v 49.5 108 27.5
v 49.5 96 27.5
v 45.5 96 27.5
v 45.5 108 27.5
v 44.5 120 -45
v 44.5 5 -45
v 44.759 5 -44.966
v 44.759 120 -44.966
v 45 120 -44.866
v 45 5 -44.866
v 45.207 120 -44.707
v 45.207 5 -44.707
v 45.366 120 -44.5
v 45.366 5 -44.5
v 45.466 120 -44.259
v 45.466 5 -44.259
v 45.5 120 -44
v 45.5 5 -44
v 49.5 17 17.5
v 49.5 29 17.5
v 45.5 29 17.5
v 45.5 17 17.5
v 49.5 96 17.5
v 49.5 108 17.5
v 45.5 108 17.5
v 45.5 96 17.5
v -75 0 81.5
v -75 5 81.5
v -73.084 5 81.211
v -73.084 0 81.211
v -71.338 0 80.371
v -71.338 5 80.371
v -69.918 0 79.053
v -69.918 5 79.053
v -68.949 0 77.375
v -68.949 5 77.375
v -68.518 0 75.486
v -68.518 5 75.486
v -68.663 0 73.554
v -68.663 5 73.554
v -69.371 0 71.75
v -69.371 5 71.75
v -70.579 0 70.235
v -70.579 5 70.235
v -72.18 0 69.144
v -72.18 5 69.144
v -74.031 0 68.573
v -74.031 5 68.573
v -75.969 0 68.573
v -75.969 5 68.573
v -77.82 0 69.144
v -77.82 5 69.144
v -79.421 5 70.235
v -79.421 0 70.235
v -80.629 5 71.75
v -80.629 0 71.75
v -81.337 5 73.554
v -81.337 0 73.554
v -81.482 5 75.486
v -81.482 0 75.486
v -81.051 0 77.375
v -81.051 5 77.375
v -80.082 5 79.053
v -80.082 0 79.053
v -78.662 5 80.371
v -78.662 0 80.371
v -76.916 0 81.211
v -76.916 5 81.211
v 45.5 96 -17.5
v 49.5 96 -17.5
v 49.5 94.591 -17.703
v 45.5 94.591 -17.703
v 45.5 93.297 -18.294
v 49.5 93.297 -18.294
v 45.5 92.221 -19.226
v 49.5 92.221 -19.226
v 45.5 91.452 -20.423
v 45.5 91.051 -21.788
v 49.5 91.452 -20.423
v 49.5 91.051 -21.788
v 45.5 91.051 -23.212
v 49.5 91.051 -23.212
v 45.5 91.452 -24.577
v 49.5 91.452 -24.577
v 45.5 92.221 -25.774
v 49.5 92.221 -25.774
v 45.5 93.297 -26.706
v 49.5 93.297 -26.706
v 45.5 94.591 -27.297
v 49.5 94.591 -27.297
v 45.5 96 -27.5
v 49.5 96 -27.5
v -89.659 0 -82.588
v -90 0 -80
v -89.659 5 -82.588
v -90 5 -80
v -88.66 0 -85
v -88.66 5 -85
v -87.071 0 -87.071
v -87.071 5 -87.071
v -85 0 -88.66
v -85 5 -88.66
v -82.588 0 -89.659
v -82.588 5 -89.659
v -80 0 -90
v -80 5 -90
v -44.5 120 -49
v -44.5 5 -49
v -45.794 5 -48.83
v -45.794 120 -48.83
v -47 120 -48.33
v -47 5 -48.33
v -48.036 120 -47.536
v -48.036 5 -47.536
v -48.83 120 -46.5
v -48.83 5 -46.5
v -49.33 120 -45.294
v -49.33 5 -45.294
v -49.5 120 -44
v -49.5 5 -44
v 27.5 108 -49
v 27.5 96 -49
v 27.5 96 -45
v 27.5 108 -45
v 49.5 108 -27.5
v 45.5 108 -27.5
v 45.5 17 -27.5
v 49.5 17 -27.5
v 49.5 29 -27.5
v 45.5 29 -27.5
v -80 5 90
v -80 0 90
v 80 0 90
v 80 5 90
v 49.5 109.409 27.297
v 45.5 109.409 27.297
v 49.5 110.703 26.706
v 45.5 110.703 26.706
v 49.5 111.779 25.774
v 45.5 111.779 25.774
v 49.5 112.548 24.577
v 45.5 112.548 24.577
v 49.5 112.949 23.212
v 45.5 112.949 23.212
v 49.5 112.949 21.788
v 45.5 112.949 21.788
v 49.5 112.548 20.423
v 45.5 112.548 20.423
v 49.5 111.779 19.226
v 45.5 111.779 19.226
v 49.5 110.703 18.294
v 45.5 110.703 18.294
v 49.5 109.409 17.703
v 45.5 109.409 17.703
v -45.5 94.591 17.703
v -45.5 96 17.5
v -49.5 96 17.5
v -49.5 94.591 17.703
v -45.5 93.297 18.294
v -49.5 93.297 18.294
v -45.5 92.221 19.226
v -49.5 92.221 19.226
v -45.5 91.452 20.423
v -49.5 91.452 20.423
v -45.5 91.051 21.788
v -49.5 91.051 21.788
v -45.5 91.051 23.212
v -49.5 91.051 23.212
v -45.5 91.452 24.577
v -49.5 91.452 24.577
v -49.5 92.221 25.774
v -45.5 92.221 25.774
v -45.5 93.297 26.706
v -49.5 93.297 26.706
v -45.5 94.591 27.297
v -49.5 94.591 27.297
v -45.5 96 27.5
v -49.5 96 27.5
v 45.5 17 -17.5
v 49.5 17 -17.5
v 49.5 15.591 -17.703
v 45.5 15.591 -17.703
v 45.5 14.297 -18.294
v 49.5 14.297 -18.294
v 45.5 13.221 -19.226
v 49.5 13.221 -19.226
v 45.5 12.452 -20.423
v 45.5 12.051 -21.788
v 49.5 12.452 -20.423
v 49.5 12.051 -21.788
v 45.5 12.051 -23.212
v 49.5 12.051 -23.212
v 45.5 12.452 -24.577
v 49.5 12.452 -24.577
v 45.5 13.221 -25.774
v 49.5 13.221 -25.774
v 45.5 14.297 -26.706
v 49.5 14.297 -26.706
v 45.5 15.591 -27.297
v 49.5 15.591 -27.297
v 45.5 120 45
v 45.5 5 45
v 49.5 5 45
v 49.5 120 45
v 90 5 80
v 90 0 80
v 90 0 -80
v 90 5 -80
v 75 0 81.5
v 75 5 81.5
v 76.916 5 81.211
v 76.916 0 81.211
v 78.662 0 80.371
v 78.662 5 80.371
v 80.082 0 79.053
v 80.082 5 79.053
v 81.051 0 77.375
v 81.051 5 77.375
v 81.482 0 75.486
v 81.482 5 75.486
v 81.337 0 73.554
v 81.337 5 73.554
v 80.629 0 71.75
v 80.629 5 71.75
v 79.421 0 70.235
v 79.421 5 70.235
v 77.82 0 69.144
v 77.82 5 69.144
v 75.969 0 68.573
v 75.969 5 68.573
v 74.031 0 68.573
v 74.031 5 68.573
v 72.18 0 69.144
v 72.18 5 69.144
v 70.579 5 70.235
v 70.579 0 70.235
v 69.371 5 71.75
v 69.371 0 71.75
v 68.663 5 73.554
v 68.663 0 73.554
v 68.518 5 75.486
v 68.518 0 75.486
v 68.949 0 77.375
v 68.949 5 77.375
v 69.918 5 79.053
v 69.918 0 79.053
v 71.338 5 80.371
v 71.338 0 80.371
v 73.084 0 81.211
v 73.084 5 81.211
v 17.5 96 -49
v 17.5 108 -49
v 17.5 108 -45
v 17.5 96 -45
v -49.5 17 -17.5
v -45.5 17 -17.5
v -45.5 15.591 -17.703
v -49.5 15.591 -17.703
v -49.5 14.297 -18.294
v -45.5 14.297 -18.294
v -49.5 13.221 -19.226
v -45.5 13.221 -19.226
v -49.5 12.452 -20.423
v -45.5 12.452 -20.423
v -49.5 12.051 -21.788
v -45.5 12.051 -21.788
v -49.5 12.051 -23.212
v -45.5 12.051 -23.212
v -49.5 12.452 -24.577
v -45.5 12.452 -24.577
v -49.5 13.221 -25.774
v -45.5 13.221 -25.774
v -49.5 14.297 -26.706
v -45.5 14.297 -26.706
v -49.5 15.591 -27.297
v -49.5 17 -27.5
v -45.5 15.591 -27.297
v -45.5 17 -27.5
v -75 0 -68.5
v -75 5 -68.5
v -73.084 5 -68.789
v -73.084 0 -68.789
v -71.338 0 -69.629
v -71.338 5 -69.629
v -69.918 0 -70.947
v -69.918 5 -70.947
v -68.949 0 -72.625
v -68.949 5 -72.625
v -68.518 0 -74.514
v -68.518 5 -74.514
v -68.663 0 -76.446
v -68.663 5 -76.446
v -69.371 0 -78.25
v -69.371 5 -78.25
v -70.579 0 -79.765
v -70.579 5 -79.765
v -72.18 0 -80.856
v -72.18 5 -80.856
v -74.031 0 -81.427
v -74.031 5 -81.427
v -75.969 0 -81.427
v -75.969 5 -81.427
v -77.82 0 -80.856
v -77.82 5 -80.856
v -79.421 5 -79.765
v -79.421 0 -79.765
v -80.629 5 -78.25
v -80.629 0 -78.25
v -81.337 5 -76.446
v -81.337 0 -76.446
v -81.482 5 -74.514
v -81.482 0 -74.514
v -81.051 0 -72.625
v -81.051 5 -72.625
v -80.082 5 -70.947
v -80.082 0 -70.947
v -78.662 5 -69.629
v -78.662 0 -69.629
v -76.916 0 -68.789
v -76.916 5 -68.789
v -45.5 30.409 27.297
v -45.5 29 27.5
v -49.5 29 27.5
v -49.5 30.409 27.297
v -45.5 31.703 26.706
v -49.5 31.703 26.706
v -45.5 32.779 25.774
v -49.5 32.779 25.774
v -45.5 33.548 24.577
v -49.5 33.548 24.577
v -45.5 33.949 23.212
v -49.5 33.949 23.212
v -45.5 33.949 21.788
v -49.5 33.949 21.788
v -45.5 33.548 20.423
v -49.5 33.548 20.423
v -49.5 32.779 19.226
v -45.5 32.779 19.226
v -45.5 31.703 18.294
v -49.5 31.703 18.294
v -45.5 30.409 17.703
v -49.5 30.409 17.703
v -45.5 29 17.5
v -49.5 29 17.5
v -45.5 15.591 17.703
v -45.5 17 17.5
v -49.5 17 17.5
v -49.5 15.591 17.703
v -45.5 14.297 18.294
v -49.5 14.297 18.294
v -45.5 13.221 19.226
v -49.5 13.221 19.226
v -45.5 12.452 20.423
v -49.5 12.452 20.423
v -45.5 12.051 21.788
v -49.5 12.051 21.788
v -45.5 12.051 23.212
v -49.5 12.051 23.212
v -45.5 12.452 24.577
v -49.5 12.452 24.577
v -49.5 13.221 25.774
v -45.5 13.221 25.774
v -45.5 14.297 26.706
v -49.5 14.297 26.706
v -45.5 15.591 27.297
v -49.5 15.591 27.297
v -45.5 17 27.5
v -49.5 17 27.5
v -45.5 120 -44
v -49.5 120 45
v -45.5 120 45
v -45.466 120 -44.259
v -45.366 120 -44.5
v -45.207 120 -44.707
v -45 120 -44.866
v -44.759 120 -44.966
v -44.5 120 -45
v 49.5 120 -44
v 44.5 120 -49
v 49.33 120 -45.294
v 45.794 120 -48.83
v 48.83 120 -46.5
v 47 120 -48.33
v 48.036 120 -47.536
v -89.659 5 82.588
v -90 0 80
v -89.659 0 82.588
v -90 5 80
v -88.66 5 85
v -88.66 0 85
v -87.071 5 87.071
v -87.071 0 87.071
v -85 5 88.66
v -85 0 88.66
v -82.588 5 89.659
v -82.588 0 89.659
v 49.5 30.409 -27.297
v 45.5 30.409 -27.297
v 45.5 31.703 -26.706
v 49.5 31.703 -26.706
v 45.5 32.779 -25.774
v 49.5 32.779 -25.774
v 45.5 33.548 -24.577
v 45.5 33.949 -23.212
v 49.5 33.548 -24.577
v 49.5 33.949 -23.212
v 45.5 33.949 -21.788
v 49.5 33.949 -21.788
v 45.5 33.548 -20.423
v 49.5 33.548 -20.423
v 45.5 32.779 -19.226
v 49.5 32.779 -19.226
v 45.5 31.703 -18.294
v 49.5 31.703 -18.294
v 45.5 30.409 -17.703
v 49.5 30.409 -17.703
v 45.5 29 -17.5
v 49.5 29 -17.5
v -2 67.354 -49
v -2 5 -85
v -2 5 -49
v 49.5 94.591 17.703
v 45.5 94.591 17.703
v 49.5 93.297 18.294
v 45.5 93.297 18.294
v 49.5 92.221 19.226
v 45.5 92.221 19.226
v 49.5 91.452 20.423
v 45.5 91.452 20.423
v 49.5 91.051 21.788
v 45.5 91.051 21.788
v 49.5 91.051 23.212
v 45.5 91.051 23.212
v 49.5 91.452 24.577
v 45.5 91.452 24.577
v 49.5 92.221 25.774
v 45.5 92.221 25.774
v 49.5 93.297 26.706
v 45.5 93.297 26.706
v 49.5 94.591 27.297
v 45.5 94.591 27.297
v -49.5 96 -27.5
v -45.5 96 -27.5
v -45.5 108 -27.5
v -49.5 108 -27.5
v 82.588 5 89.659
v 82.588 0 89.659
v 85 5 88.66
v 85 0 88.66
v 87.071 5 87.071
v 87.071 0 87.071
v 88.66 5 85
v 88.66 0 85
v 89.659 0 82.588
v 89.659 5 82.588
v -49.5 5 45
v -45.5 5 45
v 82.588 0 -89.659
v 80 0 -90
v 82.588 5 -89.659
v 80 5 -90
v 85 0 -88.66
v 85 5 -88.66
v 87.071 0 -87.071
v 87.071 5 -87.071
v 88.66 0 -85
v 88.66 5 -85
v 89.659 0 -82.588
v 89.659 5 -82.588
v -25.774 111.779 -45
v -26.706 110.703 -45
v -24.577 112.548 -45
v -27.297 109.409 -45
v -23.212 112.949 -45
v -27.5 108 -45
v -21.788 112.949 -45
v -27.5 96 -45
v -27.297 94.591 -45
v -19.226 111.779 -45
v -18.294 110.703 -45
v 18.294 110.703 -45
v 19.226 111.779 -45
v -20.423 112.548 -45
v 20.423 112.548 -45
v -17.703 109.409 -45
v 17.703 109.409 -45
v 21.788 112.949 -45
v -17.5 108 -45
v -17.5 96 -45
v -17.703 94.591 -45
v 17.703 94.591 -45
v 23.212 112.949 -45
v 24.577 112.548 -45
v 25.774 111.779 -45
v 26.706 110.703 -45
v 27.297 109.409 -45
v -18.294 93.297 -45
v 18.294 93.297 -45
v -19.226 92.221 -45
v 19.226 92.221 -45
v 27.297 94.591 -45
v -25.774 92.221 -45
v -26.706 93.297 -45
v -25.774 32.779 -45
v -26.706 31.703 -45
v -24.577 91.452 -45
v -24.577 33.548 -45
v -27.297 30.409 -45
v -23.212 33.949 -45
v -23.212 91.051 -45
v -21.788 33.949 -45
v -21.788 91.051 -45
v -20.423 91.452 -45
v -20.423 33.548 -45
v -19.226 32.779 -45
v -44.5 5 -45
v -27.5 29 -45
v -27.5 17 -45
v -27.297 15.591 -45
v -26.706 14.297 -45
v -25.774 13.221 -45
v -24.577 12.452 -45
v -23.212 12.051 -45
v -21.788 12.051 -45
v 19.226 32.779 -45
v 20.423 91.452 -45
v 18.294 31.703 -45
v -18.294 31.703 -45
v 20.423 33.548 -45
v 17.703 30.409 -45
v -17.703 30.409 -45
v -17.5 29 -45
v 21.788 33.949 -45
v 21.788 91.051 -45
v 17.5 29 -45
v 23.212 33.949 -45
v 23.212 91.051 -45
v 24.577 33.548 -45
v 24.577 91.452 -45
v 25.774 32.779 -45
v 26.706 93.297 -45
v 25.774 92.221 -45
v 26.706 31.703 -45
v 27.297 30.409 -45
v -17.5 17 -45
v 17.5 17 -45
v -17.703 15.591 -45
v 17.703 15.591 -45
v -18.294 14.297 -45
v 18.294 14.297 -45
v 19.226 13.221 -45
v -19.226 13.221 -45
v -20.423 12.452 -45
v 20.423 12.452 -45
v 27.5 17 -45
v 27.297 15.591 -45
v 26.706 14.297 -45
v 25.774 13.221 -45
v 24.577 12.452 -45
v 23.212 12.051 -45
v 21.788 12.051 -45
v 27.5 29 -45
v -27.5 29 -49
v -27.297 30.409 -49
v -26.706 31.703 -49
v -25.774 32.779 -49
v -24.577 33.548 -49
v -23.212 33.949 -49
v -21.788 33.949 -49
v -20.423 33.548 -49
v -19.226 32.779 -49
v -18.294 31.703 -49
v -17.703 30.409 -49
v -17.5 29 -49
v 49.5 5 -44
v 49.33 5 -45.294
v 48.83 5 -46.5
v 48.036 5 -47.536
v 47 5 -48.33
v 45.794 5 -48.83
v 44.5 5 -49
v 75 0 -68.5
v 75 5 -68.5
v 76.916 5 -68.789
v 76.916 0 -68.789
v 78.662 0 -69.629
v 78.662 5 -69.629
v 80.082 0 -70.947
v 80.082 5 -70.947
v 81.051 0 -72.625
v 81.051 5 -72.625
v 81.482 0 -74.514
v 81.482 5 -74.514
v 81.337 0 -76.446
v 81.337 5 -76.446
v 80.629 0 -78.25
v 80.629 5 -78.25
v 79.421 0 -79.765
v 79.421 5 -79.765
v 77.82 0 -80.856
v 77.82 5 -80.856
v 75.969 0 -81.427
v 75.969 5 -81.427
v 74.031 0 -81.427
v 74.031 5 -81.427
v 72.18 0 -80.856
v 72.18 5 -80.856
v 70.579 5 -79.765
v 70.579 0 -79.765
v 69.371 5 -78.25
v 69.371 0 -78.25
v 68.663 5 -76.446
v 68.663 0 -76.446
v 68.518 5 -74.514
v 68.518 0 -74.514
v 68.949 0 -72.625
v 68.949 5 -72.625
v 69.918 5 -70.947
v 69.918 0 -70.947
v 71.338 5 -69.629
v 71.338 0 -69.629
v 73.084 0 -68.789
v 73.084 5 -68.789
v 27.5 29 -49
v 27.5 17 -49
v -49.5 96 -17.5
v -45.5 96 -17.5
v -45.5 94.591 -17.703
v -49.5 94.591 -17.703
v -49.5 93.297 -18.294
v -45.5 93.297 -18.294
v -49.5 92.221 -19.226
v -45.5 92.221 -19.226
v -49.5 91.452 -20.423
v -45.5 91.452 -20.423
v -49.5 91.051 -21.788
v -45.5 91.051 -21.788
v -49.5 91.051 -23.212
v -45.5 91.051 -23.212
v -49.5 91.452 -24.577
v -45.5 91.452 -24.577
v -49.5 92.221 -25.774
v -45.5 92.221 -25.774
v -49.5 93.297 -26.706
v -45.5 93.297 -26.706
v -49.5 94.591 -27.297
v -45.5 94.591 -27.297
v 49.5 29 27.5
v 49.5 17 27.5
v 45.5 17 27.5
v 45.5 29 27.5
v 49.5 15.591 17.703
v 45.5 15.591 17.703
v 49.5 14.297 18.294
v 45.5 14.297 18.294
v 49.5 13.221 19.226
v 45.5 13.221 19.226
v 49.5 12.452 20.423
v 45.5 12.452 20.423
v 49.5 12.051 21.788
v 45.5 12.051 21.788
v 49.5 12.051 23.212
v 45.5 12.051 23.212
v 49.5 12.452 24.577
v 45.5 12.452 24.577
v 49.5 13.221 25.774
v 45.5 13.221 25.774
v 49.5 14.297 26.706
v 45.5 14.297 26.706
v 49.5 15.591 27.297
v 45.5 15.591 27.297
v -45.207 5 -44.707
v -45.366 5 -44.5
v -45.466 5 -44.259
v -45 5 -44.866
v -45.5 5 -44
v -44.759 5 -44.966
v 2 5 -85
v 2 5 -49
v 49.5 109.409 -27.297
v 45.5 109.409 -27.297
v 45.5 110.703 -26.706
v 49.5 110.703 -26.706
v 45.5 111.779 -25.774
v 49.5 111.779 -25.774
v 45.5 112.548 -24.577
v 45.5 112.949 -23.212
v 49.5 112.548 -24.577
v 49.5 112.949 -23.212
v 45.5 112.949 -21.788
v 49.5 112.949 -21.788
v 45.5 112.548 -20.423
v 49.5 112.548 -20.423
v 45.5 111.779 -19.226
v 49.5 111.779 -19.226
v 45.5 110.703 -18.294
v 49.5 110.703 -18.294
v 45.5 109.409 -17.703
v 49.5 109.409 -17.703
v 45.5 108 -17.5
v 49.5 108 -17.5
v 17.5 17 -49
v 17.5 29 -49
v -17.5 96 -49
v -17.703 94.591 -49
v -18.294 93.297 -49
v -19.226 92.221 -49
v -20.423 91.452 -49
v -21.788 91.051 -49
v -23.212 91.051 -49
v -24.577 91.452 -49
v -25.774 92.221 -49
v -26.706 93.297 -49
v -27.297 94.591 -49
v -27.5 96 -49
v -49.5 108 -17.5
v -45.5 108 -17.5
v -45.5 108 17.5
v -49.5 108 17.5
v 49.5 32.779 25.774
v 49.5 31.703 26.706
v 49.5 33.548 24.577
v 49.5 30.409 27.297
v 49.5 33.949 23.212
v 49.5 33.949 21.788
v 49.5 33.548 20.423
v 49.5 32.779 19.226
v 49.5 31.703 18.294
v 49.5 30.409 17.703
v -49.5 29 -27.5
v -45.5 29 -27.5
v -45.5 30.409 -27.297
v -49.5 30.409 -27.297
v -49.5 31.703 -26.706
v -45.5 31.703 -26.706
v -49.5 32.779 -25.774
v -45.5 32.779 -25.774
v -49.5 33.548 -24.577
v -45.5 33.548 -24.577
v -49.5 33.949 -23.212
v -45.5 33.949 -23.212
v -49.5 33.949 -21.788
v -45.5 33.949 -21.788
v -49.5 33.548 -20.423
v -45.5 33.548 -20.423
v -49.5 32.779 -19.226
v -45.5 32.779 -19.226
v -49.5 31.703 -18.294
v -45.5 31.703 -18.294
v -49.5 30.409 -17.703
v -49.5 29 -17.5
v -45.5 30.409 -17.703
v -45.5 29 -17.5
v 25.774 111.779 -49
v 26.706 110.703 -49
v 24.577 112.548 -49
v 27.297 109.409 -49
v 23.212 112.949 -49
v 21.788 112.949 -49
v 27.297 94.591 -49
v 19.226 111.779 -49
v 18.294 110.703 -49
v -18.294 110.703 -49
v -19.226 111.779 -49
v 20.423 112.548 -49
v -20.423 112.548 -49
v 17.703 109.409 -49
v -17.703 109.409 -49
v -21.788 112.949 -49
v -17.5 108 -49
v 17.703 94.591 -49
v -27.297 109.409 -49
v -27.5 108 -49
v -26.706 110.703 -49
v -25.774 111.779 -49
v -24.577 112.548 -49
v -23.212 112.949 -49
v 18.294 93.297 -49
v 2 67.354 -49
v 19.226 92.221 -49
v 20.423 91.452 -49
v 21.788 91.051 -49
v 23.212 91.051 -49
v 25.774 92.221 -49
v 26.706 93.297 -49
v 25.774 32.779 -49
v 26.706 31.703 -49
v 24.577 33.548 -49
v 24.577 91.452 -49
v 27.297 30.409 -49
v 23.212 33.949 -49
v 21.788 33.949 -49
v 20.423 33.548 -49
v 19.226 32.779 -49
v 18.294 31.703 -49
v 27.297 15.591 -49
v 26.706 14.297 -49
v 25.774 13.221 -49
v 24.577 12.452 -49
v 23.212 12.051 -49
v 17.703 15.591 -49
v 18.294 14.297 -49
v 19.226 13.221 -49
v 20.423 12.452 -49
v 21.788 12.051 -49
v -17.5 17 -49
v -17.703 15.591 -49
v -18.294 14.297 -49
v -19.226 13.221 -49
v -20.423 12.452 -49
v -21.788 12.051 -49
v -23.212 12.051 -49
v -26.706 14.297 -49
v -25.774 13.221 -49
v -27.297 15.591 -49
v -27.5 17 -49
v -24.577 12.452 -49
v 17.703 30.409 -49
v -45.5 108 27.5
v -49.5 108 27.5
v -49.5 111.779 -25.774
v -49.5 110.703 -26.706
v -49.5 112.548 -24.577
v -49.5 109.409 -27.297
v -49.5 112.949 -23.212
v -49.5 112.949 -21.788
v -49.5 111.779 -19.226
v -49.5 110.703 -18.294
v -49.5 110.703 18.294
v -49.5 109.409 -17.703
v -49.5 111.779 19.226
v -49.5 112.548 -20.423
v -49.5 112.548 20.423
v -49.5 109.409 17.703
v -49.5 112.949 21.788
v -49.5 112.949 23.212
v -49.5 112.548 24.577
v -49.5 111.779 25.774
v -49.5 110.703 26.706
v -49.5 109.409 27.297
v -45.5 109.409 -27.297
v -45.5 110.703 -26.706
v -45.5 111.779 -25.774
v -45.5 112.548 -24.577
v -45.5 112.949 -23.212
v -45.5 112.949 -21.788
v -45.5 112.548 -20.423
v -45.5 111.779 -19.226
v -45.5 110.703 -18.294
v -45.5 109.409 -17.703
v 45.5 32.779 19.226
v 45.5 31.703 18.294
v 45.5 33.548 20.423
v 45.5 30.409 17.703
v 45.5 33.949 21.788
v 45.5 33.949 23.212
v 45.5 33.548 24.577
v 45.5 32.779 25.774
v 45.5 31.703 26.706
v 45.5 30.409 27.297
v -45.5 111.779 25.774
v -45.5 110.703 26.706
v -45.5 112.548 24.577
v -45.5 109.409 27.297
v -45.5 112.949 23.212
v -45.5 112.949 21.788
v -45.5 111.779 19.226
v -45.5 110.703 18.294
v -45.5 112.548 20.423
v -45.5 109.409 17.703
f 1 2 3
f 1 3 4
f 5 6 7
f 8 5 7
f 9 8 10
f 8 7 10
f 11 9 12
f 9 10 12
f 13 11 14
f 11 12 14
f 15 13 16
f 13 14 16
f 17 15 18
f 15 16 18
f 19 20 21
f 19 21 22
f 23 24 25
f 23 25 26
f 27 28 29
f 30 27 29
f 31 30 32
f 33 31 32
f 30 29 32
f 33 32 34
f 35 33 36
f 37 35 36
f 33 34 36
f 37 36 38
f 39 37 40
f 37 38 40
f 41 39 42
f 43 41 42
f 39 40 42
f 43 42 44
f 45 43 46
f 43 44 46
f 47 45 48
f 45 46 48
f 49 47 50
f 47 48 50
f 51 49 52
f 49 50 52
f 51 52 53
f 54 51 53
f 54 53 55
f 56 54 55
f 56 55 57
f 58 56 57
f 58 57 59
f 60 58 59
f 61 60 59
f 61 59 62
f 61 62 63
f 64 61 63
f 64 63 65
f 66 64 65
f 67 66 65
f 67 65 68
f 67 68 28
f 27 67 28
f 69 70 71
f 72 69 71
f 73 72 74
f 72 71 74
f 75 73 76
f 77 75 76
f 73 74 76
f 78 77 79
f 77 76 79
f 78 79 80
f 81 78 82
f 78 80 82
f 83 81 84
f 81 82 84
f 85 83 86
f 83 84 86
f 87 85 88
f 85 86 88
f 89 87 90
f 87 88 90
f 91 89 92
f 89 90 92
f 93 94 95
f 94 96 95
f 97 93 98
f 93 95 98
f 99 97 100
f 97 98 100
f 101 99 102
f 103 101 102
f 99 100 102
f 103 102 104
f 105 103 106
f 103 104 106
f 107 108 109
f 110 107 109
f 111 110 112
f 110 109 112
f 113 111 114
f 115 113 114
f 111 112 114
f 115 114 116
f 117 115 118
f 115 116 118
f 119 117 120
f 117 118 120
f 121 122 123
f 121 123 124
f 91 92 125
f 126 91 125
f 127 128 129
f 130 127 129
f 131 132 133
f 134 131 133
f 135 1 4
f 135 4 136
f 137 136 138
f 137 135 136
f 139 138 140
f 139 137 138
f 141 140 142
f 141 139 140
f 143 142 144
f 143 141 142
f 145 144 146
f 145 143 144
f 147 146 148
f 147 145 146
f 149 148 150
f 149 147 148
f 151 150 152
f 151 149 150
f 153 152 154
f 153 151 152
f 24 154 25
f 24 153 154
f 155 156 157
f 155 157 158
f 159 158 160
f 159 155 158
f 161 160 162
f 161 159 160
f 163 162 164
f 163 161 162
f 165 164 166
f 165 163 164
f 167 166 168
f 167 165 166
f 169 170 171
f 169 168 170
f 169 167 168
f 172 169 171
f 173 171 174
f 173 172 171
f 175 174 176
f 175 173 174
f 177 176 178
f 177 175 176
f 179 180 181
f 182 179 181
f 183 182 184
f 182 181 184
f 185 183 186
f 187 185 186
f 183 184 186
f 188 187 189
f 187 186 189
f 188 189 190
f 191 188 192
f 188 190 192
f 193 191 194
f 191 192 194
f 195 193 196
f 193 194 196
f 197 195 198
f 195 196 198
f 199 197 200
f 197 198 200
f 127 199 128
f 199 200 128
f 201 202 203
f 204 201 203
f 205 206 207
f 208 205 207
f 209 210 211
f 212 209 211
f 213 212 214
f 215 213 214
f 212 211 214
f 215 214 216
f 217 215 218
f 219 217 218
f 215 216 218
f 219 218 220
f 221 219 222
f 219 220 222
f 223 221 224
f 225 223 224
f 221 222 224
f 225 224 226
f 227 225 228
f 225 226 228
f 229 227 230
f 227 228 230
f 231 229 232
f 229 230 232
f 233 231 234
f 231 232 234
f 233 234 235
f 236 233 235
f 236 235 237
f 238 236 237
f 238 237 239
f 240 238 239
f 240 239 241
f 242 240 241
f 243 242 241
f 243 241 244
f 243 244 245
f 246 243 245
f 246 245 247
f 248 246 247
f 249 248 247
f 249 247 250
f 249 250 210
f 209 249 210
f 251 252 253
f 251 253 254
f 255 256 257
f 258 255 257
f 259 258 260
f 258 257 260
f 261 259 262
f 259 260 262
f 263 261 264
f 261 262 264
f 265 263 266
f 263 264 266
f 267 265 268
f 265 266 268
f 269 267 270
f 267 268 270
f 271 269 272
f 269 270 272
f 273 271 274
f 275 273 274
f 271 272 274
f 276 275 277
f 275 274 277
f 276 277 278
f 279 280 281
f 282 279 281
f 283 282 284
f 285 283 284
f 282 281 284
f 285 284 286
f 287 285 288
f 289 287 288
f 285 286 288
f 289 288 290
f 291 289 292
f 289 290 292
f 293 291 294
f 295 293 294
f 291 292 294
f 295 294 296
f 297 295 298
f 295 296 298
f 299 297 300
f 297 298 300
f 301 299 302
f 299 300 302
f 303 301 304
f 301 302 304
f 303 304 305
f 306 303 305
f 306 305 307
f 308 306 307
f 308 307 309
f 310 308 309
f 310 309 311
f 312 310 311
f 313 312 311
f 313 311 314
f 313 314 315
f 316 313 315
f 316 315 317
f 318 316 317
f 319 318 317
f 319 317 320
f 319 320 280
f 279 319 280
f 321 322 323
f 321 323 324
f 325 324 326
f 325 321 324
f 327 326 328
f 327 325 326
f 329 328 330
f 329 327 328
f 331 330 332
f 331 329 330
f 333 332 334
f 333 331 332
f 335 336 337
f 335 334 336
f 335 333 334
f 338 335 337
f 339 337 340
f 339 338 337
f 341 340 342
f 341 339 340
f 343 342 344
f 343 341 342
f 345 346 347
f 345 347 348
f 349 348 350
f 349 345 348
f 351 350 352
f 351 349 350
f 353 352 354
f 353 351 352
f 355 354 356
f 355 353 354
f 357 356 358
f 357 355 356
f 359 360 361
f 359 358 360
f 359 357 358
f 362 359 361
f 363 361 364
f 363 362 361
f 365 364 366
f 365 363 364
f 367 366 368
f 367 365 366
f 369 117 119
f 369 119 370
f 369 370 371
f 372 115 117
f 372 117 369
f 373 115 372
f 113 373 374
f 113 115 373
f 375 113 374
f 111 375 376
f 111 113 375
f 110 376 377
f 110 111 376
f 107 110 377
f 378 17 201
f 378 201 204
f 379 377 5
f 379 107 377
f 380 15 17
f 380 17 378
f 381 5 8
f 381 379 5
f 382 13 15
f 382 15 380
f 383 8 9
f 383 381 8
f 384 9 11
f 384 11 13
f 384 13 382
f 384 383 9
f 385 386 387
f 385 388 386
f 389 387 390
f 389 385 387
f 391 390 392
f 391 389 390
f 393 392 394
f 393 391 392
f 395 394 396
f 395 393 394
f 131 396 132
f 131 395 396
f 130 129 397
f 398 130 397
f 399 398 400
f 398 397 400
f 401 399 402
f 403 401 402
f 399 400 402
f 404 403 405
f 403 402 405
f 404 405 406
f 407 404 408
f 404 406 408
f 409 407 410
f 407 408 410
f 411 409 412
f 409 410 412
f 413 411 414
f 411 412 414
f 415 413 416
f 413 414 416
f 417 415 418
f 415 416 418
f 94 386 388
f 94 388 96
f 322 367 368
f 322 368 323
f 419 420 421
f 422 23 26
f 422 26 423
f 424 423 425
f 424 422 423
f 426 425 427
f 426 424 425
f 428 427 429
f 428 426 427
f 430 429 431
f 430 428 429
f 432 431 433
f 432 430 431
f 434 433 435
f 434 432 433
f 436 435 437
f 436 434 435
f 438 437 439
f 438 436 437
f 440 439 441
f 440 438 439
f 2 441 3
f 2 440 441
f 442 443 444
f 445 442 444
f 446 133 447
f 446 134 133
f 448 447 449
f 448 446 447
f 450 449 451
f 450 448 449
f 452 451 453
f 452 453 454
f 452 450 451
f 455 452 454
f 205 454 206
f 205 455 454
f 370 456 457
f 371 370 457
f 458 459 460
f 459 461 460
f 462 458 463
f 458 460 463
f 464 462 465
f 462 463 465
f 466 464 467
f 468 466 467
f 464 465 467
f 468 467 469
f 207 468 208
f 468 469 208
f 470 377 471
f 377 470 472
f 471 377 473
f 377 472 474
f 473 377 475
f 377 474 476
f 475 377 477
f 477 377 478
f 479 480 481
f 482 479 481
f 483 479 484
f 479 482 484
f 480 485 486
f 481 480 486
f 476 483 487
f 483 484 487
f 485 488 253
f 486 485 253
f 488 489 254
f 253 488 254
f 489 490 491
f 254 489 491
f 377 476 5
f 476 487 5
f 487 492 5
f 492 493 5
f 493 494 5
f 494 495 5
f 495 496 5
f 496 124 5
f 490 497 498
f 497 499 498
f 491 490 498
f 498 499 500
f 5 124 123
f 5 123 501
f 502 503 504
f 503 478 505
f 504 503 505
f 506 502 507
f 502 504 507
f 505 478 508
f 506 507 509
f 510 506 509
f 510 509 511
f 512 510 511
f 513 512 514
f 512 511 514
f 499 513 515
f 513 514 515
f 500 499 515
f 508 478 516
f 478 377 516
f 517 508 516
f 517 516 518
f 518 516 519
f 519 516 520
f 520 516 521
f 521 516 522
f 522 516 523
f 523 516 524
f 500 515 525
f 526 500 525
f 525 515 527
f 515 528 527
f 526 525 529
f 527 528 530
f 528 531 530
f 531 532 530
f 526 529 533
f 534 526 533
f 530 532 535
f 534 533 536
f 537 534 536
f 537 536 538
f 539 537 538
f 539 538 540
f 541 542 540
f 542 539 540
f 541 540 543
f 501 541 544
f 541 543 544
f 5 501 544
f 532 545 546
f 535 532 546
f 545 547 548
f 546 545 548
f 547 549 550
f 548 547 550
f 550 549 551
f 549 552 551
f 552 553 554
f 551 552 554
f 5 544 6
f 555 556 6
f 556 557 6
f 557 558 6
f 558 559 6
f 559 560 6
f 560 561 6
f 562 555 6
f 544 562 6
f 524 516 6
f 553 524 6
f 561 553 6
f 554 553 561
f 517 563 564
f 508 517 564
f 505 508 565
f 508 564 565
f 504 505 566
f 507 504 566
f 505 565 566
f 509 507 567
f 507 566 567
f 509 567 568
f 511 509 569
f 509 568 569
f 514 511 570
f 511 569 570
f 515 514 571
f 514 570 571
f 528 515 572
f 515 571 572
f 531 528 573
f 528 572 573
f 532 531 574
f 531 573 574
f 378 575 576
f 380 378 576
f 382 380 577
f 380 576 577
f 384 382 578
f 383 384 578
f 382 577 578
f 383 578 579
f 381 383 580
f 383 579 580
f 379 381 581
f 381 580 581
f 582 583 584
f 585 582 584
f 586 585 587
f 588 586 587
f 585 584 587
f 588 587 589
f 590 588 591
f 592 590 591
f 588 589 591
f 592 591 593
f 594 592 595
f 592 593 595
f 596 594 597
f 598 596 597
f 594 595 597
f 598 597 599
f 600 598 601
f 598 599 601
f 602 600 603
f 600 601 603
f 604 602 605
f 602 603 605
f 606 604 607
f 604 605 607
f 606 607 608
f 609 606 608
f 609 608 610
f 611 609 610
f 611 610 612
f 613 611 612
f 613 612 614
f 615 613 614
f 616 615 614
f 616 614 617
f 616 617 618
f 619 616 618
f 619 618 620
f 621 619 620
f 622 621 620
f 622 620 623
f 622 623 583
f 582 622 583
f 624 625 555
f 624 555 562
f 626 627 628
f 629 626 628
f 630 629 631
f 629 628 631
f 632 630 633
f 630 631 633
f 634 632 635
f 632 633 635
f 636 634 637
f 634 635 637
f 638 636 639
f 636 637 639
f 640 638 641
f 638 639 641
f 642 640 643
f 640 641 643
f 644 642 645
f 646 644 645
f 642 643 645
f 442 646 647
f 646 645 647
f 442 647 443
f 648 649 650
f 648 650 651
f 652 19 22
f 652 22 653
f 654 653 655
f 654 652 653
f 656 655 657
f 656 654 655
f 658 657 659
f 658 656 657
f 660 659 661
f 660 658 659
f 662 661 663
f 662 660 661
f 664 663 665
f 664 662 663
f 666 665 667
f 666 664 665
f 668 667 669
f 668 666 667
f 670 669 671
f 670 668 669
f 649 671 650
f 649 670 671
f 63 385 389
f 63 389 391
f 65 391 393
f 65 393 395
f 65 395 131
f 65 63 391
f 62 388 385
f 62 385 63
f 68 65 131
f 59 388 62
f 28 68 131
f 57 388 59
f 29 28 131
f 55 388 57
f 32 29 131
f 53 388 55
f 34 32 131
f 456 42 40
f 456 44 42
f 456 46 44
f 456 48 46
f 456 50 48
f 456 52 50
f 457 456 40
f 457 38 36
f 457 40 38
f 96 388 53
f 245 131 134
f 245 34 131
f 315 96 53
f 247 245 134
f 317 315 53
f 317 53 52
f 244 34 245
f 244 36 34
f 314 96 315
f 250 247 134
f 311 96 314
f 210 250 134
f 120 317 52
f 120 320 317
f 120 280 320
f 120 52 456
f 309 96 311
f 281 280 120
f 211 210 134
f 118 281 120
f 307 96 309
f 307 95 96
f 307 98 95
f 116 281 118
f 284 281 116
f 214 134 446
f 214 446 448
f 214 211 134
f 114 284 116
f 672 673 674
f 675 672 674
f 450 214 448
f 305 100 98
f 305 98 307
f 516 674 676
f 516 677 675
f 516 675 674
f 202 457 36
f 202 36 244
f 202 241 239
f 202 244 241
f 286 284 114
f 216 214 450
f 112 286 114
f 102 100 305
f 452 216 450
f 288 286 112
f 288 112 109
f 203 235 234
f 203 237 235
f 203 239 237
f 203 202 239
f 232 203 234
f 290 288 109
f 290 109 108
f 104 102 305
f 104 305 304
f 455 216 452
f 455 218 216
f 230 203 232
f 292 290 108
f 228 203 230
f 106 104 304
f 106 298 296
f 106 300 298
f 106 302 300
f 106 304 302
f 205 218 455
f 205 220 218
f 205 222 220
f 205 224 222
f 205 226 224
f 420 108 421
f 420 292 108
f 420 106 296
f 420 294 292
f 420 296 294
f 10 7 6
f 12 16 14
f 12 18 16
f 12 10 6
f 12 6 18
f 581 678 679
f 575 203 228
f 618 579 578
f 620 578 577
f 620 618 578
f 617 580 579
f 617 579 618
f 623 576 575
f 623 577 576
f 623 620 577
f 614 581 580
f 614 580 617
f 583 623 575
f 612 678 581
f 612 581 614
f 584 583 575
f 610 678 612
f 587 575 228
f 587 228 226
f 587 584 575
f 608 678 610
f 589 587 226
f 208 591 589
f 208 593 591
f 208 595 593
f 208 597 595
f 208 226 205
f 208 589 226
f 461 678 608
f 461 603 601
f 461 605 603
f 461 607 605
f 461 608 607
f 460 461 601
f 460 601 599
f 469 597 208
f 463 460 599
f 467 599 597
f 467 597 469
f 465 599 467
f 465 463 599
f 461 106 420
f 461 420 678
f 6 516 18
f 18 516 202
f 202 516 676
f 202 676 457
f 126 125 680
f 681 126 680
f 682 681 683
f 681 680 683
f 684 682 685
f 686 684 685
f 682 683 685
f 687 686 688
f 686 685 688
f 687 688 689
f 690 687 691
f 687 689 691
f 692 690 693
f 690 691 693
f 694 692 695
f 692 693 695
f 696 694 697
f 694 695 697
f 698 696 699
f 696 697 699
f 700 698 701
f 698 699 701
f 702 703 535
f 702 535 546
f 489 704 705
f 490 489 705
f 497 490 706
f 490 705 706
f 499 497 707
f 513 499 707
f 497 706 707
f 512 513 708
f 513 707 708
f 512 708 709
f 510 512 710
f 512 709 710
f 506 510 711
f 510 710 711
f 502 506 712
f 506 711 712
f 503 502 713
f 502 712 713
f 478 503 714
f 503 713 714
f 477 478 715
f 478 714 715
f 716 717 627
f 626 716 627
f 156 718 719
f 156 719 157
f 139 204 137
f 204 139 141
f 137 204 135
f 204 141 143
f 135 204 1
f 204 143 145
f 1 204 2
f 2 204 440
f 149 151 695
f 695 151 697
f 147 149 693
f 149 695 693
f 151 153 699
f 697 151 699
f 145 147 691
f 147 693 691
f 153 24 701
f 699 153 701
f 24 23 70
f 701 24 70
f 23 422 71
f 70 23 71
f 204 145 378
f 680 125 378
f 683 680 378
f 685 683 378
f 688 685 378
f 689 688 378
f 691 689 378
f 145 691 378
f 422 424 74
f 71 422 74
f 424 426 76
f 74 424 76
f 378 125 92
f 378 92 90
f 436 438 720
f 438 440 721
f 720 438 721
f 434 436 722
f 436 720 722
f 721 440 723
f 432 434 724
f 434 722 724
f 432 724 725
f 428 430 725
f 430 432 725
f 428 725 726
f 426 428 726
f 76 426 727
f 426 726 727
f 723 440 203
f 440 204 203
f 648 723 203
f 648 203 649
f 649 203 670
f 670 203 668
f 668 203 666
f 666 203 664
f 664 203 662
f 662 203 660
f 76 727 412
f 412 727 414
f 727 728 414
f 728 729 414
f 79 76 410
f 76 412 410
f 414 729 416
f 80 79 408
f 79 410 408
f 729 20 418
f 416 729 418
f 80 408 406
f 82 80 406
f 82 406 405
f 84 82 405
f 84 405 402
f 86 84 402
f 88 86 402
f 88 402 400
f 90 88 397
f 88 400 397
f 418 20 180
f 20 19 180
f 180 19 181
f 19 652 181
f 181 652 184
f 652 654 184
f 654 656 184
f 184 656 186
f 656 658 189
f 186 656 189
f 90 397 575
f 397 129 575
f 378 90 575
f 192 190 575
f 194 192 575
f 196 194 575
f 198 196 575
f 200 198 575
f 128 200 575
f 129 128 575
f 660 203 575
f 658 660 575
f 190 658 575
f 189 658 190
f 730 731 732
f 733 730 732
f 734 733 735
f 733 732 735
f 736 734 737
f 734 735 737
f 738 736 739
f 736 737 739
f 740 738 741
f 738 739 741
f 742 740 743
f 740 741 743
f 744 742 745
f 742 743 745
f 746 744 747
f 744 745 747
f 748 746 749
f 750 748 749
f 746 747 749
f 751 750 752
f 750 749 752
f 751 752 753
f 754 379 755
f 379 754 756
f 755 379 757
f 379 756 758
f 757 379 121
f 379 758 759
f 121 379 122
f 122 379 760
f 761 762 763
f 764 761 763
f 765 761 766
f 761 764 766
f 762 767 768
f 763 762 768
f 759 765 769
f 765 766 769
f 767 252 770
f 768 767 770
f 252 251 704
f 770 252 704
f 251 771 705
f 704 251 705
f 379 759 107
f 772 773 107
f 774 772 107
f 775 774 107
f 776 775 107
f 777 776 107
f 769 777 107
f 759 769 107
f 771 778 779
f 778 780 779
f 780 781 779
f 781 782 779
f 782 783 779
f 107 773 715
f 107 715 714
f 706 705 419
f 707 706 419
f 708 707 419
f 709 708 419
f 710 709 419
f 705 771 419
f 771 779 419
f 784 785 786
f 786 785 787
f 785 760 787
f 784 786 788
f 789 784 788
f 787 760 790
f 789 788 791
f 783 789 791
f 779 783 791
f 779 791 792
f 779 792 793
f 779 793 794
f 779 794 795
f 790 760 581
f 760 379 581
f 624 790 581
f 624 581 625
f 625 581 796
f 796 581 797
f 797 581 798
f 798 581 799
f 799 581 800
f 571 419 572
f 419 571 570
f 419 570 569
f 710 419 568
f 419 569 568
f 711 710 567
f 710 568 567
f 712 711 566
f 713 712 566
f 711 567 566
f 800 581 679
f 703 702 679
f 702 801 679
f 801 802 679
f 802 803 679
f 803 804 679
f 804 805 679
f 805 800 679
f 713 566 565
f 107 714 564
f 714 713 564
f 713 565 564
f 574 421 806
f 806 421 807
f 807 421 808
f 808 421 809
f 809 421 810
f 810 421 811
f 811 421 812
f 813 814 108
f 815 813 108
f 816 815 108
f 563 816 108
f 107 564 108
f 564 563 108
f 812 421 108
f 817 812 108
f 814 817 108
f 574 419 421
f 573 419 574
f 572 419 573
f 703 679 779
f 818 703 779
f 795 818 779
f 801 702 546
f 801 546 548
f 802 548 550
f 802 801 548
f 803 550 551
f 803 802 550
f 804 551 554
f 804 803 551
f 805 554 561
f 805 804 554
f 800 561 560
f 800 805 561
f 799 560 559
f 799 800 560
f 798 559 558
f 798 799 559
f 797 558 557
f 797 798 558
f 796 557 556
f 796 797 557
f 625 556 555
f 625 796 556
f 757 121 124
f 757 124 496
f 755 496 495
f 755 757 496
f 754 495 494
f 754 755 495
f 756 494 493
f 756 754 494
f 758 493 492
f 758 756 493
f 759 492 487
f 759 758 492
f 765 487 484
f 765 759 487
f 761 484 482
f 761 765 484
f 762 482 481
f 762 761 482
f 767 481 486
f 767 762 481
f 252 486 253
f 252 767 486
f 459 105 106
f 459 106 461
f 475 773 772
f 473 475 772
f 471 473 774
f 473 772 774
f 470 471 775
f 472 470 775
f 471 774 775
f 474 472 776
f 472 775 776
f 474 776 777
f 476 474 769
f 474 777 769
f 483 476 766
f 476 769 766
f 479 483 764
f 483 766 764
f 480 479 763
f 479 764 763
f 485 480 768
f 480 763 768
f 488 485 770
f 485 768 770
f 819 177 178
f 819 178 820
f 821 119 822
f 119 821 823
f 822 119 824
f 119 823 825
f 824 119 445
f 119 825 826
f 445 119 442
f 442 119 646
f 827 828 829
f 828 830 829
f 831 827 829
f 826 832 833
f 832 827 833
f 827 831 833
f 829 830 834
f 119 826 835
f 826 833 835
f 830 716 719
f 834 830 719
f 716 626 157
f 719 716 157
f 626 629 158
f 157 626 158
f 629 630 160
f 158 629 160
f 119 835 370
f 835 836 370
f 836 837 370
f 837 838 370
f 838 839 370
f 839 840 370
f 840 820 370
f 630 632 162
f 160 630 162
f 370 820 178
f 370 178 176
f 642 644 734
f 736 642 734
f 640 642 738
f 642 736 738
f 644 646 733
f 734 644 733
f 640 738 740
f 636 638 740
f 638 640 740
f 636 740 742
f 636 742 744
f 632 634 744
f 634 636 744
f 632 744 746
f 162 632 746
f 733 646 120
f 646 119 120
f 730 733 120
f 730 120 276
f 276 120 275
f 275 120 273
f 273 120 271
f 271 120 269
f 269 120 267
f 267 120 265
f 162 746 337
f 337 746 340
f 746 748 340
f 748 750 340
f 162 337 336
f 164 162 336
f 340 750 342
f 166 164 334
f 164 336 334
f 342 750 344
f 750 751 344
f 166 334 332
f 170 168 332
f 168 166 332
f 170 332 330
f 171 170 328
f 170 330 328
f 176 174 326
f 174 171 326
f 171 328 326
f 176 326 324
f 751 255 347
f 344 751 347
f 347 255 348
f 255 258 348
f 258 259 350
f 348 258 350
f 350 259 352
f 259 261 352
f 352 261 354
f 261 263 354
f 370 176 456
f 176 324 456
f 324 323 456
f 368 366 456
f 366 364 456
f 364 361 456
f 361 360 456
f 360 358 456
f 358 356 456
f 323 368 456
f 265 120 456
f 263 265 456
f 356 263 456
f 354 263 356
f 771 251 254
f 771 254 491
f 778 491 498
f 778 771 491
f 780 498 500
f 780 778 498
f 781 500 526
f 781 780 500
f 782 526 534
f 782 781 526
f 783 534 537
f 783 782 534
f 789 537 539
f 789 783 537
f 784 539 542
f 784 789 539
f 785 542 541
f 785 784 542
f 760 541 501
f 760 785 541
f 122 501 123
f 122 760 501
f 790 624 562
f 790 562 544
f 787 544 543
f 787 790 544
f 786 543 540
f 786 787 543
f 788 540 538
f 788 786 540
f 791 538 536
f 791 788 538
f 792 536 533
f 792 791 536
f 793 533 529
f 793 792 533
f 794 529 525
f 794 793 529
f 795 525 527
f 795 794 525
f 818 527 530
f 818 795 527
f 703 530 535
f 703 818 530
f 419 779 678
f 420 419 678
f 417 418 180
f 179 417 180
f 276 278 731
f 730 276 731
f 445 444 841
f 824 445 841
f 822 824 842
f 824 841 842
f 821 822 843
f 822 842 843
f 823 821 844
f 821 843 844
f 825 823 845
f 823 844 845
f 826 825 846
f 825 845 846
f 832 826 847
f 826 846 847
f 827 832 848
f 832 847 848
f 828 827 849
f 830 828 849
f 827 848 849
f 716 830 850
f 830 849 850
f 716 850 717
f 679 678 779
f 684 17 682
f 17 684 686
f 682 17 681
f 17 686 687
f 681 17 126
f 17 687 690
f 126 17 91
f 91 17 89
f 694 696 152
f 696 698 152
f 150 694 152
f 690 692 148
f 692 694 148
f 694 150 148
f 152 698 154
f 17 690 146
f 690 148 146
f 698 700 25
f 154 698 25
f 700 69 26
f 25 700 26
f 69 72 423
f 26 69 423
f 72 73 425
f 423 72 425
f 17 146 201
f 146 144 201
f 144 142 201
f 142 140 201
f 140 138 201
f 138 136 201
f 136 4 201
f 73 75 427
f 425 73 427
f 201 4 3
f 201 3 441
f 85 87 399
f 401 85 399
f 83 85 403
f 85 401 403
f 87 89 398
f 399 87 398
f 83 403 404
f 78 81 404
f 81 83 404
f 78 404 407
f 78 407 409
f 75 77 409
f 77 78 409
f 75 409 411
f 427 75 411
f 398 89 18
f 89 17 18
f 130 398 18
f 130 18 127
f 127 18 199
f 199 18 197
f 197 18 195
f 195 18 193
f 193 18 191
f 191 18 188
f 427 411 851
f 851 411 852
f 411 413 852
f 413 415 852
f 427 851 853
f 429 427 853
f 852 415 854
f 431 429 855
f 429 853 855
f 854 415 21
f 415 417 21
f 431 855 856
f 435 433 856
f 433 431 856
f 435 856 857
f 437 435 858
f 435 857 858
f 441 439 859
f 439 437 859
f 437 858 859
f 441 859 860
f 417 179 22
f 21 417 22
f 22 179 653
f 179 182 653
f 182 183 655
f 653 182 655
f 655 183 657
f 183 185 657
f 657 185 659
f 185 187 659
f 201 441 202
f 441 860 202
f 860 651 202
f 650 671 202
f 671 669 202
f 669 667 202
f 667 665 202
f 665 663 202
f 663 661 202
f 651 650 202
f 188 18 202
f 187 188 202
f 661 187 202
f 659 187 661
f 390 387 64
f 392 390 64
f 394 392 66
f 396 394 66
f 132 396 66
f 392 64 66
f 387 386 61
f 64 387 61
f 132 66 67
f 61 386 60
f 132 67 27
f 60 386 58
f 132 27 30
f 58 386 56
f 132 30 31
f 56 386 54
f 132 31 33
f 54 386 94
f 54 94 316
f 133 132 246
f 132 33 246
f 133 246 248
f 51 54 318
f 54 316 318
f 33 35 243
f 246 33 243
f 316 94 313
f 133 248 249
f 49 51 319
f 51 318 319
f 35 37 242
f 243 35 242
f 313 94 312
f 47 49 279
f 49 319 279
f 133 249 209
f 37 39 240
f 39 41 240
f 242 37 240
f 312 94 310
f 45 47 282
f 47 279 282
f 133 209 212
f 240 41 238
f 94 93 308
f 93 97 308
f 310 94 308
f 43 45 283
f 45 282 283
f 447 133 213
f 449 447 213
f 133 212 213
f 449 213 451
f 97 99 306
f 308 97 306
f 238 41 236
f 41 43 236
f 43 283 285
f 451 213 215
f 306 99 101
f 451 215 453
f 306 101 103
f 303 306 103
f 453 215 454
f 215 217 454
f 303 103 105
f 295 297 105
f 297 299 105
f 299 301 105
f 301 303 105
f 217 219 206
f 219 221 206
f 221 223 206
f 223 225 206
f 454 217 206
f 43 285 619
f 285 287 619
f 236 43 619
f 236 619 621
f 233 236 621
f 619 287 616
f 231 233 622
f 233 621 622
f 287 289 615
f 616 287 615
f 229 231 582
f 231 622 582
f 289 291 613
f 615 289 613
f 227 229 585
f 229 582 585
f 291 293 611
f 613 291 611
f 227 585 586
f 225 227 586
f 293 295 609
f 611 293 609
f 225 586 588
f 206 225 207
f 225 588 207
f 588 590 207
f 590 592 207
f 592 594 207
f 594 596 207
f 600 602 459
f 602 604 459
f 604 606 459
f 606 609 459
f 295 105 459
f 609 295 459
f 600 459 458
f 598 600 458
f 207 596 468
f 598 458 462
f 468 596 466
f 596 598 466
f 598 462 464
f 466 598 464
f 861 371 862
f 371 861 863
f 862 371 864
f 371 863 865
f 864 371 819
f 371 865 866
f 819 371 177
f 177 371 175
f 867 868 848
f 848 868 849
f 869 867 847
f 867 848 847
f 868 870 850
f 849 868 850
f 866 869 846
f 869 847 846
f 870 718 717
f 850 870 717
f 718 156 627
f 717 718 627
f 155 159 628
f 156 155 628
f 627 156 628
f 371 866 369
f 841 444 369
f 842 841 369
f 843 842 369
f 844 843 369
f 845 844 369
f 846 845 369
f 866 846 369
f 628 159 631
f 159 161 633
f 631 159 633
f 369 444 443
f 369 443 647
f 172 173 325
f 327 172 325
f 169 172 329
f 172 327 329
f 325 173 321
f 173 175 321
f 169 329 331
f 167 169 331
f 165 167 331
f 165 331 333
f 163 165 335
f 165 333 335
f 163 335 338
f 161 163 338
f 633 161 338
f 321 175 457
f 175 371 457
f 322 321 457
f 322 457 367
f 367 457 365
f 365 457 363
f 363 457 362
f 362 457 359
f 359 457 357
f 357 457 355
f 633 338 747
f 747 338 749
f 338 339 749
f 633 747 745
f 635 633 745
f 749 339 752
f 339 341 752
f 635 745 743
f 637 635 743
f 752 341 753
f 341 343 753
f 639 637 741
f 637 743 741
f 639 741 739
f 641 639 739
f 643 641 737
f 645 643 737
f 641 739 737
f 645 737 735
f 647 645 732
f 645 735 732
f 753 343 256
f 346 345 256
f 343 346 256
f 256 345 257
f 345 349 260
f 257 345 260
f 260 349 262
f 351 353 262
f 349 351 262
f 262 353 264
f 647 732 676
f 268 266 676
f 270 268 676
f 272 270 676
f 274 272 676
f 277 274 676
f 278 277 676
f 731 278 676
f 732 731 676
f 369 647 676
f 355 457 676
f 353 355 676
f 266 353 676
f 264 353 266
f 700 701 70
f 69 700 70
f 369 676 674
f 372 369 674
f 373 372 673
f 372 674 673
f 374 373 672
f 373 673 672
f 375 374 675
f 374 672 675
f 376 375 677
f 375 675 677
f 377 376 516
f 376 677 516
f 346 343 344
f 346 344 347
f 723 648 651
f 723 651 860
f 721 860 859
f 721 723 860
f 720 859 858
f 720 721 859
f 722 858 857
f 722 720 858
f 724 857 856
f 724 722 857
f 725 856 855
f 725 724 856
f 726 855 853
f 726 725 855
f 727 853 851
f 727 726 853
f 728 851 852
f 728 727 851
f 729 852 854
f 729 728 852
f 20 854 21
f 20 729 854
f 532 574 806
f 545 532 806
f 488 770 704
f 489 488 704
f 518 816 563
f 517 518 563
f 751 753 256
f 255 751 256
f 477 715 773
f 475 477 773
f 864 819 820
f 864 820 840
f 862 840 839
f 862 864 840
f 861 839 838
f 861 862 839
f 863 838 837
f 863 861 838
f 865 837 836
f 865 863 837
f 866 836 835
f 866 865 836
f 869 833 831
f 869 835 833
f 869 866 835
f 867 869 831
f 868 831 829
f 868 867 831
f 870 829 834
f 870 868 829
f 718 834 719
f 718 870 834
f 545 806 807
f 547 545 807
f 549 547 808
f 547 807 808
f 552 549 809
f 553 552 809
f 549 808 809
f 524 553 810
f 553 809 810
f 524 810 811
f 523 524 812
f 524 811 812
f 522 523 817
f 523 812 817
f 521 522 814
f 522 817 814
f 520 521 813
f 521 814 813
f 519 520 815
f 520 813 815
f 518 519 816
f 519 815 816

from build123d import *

# Parameters (mm, degrees)
SKETCH_2_W          = 180
SKETCH_2_H          = 180
EXTRUDE_1_DEPTH     = 5
EXTRUDE_1_2_DEPTH   = 115
EXTRUDE_2_DEPTH     = 2
CUT_EXTRUDE_1_DEPTH = 140.5
SKETCH_6_R          = 6.5
CUT_EXTRUDE_2_DEPTH = 6
FILLET_1_R          = 10
CUT_EXTRUDE_3_REACH = 141


with BuildPart() as part:
    # Эскиз2 → Extrude 1 (new body)
    with BuildSketch(Plane(origin=(0, 0, 0), x_dir=(1, 0, 0), z_dir=(0, 1, 0))):
        Rectangle(SKETCH_2_W, SKETCH_2_H)
    extrude(amount=EXTRUDE_1_DEPTH)

    # Эскиз3 → Extrude 1 2 (add)
    with BuildSketch(Plane(origin=(0, 5, 0), x_dir=(1, 0, 0), z_dir=(0, 1, 0))):
        with BuildLine():
            Line((-45.5, -45), (-45.5, 44))
            ThreePointArc((-45.5, 44), (-45.207106781, 44.707106781), (-44.5, 45))
            Line((-44.5, 45), (44.5, 45))
            ThreePointArc((44.5, 45), (45.207106781, 44.707106781), (45.5, 44))
            Line((45.5, 44), (45.5, -45))
            Line((45.5, -45), (49.5, -45))
            Line((49.5, -45), (49.5, 44))
            ThreePointArc((49.5, 44), (48.035533906, 47.535533906), (44.5, 49))
            Line((44.5, 49), (-44.5, 49))
            ThreePointArc((-44.5, 49), (-48.035533906, 47.535533906), (-49.5, 44))
            Line((-49.5, 44), (-49.5, -45))
            Line((-49.5, -45), (-45.5, -45))
        make_face()
    extrude(amount=EXTRUDE_1_2_DEPTH)

    # Эскиз4 → Бобышка-Вытянуть2 (add, symmetric)
    with BuildSketch(Plane(origin=(0, 0, 0), x_dir=(0, 0, -1), z_dir=(1, 0, 0))):
        Polygon((49, 67.353829072), (85, 5), (49, 5), align=None)
    extrude(amount=EXTRUDE_2_DEPTH, both=True)

    # Эскиз5 → Вырез-Вытянуть1 (cut, through all)
    with BuildSketch(Plane(origin=(49.5, 0, 0), x_dir=(0, 0, -1), z_dir=(1, 0, 0))):
        with BuildLine():
            Line((-17.5, 108), (-17.5, 96))
            ThreePointArc((-17.5, 96), (-22.5, 91), (-27.5, 96))
            Line((-27.5, 96), (-27.5, 108))
            ThreePointArc((-27.5, 108), (-22.5, 113), (-17.5, 108))
        make_face()
        with BuildLine():
            Line((-17.5, 29), (-17.5, 17))
            ThreePointArc((-17.5, 17), (-22.5, 12), (-27.5, 17))
            Line((-27.5, 17), (-27.5, 29))
            ThreePointArc((-27.5, 29), (-22.5, 34), (-17.5, 29))
        make_face()
        with BuildLine():
            Line((17.5, 108), (17.5, 96))
            ThreePointArc((17.5, 96), (22.5, 91), (27.5, 96))
            Line((27.5, 96), (27.5, 108))
            ThreePointArc((27.5, 108), (22.5, 113), (17.5, 108))
        make_face()
        with BuildLine():
            Line((17.5, 29), (17.5, 17))
            ThreePointArc((17.5, 17), (22.5, 12), (27.5, 17))
            Line((27.5, 17), (27.5, 29))
            ThreePointArc((27.5, 29), (22.5, 34), (17.5, 29))
        make_face()
    extrude(amount=-CUT_EXTRUDE_1_DEPTH, mode=Mode.SUBTRACT)

    # Эскиз6 → Вырез-Вытянуть2 (cut, through all)
    with BuildSketch(Plane(origin=(0, 5, 0), x_dir=(1, 0, 0), z_dir=(0, 1, 0))):
        with Locations(Location((-75, 75, 0), (0, 0, 270))):  # turned: the seam where the file's is
            Circle(SKETCH_6_R)
        with Locations(Location((-75, -75, 0), (0, 0, 270))):  # turned: the seam where the file's is
            Circle(SKETCH_6_R)
        with Locations(Location((75, 75, 0), (0, 0, 270))):  # turned: the seam where the file's is
            Circle(SKETCH_6_R)
        with Locations(Location((75, -75, 0), (0, 0, 270))):  # turned: the seam where the file's is
            Circle(SKETCH_6_R)
    extrude(amount=-CUT_EXTRUDE_2_DEPTH, mode=Mode.SUBTRACT)

    # Скругление1
    fillet_1_edges = [part.edges().sort_by_distance(p)[0] for p in [
        (90, 2.5, 90),
        (-90, 2.5, 90),
        (-90, 2.5, -90),
        (90, 2.5, -90),
    ]]
    fillet(fillet_1_edges, radius=FILLET_1_R)

    # Эскиз8 → Вырез-Вытянуть3 (cut, up to next)
    with BuildSketch(Plane(origin=(0, 0, -49), x_dir=(-1, 0, 0), z_dir=(0, 0, -1)), mode=Mode.PRIVATE) as cut_extrude_3_sk1:
        with BuildLine():
            Line((-17.5, 108), (-17.5, 96))
            ThreePointArc((-17.5, 96), (-22.5, 91), (-27.5, 96))
            Line((-27.5, 96), (-27.5, 108))
            ThreePointArc((-27.5, 108), (-22.5, 113), (-17.5, 108))
        make_face()
    cut_extrude_3_tool1 = extrude(cut_extrude_3_sk1.sketch, amount=-CUT_EXTRUDE_3_REACH, mode=Mode.PRIVATE) & part.part
    add(cut_extrude_3_tool1.solids().sort_by_distance((22.5, 102, -49))[0], mode=Mode.SUBTRACT)
    # Эскиз8 → Вырез-Вытянуть3 (cut, up to next)
    with BuildSketch(Plane(origin=(0, 0, -49), x_dir=(-1, 0, 0), z_dir=(0, 0, -1)), mode=Mode.PRIVATE) as cut_extrude_3_sk2:
        with BuildLine():
            Line((-17.5, 29), (-17.5, 17))
            ThreePointArc((-17.5, 17), (-22.5, 12), (-27.5, 17))
            Line((-27.5, 17), (-27.5, 29))
            ThreePointArc((-27.5, 29), (-22.5, 34), (-17.5, 29))
        make_face()
    cut_extrude_3_tool2 = extrude(cut_extrude_3_sk2.sketch, amount=-CUT_EXTRUDE_3_REACH, mode=Mode.PRIVATE) & part.part
    add(cut_extrude_3_tool2.solids().sort_by_distance((22.5, 23, -49))[0], mode=Mode.SUBTRACT)
    # Эскиз8 → Вырез-Вытянуть3 (cut, up to next)
    with BuildSketch(Plane(origin=(0, 0, -49), x_dir=(-1, 0, 0), z_dir=(0, 0, -1)), mode=Mode.PRIVATE) as cut_extrude_3_sk3:
        with BuildLine():
            Line((17.5, 108), (17.5, 96))
            ThreePointArc((17.5, 96), (22.5, 91), (27.5, 96))
            Line((27.5, 96), (27.5, 108))
            ThreePointArc((27.5, 108), (22.5, 113), (17.5, 108))
        make_face()
    cut_extrude_3_tool3 = extrude(cut_extrude_3_sk3.sketch, amount=-CUT_EXTRUDE_3_REACH, mode=Mode.PRIVATE) & part.part
    add(cut_extrude_3_tool3.solids().sort_by_distance((-22.5, 102, -49))[0], mode=Mode.SUBTRACT)
    # Эскиз8 → Вырез-Вытянуть3 (cut, up to next)
    with BuildSketch(Plane(origin=(0, 0, -49), x_dir=(-1, 0, 0), z_dir=(0, 0, -1)), mode=Mode.PRIVATE) as cut_extrude_3_sk4:
        with BuildLine():
            Line((17.5, 29), (17.5, 17))
            ThreePointArc((17.5, 17), (22.5, 12), (27.5, 17))
            Line((27.5, 17), (27.5, 29))
            ThreePointArc((27.5, 29), (22.5, 34), (17.5, 29))
        make_face()
    cut_extrude_3_tool4 = extrude(cut_extrude_3_sk4.sketch, amount=-CUT_EXTRUDE_3_REACH, mode=Mode.PRIVATE) & part.part
    add(cut_extrude_3_tool4.solids().sort_by_distance((-22.5, 23, -49))[0], mode=Mode.SUBTRACT)


solid = part.part
